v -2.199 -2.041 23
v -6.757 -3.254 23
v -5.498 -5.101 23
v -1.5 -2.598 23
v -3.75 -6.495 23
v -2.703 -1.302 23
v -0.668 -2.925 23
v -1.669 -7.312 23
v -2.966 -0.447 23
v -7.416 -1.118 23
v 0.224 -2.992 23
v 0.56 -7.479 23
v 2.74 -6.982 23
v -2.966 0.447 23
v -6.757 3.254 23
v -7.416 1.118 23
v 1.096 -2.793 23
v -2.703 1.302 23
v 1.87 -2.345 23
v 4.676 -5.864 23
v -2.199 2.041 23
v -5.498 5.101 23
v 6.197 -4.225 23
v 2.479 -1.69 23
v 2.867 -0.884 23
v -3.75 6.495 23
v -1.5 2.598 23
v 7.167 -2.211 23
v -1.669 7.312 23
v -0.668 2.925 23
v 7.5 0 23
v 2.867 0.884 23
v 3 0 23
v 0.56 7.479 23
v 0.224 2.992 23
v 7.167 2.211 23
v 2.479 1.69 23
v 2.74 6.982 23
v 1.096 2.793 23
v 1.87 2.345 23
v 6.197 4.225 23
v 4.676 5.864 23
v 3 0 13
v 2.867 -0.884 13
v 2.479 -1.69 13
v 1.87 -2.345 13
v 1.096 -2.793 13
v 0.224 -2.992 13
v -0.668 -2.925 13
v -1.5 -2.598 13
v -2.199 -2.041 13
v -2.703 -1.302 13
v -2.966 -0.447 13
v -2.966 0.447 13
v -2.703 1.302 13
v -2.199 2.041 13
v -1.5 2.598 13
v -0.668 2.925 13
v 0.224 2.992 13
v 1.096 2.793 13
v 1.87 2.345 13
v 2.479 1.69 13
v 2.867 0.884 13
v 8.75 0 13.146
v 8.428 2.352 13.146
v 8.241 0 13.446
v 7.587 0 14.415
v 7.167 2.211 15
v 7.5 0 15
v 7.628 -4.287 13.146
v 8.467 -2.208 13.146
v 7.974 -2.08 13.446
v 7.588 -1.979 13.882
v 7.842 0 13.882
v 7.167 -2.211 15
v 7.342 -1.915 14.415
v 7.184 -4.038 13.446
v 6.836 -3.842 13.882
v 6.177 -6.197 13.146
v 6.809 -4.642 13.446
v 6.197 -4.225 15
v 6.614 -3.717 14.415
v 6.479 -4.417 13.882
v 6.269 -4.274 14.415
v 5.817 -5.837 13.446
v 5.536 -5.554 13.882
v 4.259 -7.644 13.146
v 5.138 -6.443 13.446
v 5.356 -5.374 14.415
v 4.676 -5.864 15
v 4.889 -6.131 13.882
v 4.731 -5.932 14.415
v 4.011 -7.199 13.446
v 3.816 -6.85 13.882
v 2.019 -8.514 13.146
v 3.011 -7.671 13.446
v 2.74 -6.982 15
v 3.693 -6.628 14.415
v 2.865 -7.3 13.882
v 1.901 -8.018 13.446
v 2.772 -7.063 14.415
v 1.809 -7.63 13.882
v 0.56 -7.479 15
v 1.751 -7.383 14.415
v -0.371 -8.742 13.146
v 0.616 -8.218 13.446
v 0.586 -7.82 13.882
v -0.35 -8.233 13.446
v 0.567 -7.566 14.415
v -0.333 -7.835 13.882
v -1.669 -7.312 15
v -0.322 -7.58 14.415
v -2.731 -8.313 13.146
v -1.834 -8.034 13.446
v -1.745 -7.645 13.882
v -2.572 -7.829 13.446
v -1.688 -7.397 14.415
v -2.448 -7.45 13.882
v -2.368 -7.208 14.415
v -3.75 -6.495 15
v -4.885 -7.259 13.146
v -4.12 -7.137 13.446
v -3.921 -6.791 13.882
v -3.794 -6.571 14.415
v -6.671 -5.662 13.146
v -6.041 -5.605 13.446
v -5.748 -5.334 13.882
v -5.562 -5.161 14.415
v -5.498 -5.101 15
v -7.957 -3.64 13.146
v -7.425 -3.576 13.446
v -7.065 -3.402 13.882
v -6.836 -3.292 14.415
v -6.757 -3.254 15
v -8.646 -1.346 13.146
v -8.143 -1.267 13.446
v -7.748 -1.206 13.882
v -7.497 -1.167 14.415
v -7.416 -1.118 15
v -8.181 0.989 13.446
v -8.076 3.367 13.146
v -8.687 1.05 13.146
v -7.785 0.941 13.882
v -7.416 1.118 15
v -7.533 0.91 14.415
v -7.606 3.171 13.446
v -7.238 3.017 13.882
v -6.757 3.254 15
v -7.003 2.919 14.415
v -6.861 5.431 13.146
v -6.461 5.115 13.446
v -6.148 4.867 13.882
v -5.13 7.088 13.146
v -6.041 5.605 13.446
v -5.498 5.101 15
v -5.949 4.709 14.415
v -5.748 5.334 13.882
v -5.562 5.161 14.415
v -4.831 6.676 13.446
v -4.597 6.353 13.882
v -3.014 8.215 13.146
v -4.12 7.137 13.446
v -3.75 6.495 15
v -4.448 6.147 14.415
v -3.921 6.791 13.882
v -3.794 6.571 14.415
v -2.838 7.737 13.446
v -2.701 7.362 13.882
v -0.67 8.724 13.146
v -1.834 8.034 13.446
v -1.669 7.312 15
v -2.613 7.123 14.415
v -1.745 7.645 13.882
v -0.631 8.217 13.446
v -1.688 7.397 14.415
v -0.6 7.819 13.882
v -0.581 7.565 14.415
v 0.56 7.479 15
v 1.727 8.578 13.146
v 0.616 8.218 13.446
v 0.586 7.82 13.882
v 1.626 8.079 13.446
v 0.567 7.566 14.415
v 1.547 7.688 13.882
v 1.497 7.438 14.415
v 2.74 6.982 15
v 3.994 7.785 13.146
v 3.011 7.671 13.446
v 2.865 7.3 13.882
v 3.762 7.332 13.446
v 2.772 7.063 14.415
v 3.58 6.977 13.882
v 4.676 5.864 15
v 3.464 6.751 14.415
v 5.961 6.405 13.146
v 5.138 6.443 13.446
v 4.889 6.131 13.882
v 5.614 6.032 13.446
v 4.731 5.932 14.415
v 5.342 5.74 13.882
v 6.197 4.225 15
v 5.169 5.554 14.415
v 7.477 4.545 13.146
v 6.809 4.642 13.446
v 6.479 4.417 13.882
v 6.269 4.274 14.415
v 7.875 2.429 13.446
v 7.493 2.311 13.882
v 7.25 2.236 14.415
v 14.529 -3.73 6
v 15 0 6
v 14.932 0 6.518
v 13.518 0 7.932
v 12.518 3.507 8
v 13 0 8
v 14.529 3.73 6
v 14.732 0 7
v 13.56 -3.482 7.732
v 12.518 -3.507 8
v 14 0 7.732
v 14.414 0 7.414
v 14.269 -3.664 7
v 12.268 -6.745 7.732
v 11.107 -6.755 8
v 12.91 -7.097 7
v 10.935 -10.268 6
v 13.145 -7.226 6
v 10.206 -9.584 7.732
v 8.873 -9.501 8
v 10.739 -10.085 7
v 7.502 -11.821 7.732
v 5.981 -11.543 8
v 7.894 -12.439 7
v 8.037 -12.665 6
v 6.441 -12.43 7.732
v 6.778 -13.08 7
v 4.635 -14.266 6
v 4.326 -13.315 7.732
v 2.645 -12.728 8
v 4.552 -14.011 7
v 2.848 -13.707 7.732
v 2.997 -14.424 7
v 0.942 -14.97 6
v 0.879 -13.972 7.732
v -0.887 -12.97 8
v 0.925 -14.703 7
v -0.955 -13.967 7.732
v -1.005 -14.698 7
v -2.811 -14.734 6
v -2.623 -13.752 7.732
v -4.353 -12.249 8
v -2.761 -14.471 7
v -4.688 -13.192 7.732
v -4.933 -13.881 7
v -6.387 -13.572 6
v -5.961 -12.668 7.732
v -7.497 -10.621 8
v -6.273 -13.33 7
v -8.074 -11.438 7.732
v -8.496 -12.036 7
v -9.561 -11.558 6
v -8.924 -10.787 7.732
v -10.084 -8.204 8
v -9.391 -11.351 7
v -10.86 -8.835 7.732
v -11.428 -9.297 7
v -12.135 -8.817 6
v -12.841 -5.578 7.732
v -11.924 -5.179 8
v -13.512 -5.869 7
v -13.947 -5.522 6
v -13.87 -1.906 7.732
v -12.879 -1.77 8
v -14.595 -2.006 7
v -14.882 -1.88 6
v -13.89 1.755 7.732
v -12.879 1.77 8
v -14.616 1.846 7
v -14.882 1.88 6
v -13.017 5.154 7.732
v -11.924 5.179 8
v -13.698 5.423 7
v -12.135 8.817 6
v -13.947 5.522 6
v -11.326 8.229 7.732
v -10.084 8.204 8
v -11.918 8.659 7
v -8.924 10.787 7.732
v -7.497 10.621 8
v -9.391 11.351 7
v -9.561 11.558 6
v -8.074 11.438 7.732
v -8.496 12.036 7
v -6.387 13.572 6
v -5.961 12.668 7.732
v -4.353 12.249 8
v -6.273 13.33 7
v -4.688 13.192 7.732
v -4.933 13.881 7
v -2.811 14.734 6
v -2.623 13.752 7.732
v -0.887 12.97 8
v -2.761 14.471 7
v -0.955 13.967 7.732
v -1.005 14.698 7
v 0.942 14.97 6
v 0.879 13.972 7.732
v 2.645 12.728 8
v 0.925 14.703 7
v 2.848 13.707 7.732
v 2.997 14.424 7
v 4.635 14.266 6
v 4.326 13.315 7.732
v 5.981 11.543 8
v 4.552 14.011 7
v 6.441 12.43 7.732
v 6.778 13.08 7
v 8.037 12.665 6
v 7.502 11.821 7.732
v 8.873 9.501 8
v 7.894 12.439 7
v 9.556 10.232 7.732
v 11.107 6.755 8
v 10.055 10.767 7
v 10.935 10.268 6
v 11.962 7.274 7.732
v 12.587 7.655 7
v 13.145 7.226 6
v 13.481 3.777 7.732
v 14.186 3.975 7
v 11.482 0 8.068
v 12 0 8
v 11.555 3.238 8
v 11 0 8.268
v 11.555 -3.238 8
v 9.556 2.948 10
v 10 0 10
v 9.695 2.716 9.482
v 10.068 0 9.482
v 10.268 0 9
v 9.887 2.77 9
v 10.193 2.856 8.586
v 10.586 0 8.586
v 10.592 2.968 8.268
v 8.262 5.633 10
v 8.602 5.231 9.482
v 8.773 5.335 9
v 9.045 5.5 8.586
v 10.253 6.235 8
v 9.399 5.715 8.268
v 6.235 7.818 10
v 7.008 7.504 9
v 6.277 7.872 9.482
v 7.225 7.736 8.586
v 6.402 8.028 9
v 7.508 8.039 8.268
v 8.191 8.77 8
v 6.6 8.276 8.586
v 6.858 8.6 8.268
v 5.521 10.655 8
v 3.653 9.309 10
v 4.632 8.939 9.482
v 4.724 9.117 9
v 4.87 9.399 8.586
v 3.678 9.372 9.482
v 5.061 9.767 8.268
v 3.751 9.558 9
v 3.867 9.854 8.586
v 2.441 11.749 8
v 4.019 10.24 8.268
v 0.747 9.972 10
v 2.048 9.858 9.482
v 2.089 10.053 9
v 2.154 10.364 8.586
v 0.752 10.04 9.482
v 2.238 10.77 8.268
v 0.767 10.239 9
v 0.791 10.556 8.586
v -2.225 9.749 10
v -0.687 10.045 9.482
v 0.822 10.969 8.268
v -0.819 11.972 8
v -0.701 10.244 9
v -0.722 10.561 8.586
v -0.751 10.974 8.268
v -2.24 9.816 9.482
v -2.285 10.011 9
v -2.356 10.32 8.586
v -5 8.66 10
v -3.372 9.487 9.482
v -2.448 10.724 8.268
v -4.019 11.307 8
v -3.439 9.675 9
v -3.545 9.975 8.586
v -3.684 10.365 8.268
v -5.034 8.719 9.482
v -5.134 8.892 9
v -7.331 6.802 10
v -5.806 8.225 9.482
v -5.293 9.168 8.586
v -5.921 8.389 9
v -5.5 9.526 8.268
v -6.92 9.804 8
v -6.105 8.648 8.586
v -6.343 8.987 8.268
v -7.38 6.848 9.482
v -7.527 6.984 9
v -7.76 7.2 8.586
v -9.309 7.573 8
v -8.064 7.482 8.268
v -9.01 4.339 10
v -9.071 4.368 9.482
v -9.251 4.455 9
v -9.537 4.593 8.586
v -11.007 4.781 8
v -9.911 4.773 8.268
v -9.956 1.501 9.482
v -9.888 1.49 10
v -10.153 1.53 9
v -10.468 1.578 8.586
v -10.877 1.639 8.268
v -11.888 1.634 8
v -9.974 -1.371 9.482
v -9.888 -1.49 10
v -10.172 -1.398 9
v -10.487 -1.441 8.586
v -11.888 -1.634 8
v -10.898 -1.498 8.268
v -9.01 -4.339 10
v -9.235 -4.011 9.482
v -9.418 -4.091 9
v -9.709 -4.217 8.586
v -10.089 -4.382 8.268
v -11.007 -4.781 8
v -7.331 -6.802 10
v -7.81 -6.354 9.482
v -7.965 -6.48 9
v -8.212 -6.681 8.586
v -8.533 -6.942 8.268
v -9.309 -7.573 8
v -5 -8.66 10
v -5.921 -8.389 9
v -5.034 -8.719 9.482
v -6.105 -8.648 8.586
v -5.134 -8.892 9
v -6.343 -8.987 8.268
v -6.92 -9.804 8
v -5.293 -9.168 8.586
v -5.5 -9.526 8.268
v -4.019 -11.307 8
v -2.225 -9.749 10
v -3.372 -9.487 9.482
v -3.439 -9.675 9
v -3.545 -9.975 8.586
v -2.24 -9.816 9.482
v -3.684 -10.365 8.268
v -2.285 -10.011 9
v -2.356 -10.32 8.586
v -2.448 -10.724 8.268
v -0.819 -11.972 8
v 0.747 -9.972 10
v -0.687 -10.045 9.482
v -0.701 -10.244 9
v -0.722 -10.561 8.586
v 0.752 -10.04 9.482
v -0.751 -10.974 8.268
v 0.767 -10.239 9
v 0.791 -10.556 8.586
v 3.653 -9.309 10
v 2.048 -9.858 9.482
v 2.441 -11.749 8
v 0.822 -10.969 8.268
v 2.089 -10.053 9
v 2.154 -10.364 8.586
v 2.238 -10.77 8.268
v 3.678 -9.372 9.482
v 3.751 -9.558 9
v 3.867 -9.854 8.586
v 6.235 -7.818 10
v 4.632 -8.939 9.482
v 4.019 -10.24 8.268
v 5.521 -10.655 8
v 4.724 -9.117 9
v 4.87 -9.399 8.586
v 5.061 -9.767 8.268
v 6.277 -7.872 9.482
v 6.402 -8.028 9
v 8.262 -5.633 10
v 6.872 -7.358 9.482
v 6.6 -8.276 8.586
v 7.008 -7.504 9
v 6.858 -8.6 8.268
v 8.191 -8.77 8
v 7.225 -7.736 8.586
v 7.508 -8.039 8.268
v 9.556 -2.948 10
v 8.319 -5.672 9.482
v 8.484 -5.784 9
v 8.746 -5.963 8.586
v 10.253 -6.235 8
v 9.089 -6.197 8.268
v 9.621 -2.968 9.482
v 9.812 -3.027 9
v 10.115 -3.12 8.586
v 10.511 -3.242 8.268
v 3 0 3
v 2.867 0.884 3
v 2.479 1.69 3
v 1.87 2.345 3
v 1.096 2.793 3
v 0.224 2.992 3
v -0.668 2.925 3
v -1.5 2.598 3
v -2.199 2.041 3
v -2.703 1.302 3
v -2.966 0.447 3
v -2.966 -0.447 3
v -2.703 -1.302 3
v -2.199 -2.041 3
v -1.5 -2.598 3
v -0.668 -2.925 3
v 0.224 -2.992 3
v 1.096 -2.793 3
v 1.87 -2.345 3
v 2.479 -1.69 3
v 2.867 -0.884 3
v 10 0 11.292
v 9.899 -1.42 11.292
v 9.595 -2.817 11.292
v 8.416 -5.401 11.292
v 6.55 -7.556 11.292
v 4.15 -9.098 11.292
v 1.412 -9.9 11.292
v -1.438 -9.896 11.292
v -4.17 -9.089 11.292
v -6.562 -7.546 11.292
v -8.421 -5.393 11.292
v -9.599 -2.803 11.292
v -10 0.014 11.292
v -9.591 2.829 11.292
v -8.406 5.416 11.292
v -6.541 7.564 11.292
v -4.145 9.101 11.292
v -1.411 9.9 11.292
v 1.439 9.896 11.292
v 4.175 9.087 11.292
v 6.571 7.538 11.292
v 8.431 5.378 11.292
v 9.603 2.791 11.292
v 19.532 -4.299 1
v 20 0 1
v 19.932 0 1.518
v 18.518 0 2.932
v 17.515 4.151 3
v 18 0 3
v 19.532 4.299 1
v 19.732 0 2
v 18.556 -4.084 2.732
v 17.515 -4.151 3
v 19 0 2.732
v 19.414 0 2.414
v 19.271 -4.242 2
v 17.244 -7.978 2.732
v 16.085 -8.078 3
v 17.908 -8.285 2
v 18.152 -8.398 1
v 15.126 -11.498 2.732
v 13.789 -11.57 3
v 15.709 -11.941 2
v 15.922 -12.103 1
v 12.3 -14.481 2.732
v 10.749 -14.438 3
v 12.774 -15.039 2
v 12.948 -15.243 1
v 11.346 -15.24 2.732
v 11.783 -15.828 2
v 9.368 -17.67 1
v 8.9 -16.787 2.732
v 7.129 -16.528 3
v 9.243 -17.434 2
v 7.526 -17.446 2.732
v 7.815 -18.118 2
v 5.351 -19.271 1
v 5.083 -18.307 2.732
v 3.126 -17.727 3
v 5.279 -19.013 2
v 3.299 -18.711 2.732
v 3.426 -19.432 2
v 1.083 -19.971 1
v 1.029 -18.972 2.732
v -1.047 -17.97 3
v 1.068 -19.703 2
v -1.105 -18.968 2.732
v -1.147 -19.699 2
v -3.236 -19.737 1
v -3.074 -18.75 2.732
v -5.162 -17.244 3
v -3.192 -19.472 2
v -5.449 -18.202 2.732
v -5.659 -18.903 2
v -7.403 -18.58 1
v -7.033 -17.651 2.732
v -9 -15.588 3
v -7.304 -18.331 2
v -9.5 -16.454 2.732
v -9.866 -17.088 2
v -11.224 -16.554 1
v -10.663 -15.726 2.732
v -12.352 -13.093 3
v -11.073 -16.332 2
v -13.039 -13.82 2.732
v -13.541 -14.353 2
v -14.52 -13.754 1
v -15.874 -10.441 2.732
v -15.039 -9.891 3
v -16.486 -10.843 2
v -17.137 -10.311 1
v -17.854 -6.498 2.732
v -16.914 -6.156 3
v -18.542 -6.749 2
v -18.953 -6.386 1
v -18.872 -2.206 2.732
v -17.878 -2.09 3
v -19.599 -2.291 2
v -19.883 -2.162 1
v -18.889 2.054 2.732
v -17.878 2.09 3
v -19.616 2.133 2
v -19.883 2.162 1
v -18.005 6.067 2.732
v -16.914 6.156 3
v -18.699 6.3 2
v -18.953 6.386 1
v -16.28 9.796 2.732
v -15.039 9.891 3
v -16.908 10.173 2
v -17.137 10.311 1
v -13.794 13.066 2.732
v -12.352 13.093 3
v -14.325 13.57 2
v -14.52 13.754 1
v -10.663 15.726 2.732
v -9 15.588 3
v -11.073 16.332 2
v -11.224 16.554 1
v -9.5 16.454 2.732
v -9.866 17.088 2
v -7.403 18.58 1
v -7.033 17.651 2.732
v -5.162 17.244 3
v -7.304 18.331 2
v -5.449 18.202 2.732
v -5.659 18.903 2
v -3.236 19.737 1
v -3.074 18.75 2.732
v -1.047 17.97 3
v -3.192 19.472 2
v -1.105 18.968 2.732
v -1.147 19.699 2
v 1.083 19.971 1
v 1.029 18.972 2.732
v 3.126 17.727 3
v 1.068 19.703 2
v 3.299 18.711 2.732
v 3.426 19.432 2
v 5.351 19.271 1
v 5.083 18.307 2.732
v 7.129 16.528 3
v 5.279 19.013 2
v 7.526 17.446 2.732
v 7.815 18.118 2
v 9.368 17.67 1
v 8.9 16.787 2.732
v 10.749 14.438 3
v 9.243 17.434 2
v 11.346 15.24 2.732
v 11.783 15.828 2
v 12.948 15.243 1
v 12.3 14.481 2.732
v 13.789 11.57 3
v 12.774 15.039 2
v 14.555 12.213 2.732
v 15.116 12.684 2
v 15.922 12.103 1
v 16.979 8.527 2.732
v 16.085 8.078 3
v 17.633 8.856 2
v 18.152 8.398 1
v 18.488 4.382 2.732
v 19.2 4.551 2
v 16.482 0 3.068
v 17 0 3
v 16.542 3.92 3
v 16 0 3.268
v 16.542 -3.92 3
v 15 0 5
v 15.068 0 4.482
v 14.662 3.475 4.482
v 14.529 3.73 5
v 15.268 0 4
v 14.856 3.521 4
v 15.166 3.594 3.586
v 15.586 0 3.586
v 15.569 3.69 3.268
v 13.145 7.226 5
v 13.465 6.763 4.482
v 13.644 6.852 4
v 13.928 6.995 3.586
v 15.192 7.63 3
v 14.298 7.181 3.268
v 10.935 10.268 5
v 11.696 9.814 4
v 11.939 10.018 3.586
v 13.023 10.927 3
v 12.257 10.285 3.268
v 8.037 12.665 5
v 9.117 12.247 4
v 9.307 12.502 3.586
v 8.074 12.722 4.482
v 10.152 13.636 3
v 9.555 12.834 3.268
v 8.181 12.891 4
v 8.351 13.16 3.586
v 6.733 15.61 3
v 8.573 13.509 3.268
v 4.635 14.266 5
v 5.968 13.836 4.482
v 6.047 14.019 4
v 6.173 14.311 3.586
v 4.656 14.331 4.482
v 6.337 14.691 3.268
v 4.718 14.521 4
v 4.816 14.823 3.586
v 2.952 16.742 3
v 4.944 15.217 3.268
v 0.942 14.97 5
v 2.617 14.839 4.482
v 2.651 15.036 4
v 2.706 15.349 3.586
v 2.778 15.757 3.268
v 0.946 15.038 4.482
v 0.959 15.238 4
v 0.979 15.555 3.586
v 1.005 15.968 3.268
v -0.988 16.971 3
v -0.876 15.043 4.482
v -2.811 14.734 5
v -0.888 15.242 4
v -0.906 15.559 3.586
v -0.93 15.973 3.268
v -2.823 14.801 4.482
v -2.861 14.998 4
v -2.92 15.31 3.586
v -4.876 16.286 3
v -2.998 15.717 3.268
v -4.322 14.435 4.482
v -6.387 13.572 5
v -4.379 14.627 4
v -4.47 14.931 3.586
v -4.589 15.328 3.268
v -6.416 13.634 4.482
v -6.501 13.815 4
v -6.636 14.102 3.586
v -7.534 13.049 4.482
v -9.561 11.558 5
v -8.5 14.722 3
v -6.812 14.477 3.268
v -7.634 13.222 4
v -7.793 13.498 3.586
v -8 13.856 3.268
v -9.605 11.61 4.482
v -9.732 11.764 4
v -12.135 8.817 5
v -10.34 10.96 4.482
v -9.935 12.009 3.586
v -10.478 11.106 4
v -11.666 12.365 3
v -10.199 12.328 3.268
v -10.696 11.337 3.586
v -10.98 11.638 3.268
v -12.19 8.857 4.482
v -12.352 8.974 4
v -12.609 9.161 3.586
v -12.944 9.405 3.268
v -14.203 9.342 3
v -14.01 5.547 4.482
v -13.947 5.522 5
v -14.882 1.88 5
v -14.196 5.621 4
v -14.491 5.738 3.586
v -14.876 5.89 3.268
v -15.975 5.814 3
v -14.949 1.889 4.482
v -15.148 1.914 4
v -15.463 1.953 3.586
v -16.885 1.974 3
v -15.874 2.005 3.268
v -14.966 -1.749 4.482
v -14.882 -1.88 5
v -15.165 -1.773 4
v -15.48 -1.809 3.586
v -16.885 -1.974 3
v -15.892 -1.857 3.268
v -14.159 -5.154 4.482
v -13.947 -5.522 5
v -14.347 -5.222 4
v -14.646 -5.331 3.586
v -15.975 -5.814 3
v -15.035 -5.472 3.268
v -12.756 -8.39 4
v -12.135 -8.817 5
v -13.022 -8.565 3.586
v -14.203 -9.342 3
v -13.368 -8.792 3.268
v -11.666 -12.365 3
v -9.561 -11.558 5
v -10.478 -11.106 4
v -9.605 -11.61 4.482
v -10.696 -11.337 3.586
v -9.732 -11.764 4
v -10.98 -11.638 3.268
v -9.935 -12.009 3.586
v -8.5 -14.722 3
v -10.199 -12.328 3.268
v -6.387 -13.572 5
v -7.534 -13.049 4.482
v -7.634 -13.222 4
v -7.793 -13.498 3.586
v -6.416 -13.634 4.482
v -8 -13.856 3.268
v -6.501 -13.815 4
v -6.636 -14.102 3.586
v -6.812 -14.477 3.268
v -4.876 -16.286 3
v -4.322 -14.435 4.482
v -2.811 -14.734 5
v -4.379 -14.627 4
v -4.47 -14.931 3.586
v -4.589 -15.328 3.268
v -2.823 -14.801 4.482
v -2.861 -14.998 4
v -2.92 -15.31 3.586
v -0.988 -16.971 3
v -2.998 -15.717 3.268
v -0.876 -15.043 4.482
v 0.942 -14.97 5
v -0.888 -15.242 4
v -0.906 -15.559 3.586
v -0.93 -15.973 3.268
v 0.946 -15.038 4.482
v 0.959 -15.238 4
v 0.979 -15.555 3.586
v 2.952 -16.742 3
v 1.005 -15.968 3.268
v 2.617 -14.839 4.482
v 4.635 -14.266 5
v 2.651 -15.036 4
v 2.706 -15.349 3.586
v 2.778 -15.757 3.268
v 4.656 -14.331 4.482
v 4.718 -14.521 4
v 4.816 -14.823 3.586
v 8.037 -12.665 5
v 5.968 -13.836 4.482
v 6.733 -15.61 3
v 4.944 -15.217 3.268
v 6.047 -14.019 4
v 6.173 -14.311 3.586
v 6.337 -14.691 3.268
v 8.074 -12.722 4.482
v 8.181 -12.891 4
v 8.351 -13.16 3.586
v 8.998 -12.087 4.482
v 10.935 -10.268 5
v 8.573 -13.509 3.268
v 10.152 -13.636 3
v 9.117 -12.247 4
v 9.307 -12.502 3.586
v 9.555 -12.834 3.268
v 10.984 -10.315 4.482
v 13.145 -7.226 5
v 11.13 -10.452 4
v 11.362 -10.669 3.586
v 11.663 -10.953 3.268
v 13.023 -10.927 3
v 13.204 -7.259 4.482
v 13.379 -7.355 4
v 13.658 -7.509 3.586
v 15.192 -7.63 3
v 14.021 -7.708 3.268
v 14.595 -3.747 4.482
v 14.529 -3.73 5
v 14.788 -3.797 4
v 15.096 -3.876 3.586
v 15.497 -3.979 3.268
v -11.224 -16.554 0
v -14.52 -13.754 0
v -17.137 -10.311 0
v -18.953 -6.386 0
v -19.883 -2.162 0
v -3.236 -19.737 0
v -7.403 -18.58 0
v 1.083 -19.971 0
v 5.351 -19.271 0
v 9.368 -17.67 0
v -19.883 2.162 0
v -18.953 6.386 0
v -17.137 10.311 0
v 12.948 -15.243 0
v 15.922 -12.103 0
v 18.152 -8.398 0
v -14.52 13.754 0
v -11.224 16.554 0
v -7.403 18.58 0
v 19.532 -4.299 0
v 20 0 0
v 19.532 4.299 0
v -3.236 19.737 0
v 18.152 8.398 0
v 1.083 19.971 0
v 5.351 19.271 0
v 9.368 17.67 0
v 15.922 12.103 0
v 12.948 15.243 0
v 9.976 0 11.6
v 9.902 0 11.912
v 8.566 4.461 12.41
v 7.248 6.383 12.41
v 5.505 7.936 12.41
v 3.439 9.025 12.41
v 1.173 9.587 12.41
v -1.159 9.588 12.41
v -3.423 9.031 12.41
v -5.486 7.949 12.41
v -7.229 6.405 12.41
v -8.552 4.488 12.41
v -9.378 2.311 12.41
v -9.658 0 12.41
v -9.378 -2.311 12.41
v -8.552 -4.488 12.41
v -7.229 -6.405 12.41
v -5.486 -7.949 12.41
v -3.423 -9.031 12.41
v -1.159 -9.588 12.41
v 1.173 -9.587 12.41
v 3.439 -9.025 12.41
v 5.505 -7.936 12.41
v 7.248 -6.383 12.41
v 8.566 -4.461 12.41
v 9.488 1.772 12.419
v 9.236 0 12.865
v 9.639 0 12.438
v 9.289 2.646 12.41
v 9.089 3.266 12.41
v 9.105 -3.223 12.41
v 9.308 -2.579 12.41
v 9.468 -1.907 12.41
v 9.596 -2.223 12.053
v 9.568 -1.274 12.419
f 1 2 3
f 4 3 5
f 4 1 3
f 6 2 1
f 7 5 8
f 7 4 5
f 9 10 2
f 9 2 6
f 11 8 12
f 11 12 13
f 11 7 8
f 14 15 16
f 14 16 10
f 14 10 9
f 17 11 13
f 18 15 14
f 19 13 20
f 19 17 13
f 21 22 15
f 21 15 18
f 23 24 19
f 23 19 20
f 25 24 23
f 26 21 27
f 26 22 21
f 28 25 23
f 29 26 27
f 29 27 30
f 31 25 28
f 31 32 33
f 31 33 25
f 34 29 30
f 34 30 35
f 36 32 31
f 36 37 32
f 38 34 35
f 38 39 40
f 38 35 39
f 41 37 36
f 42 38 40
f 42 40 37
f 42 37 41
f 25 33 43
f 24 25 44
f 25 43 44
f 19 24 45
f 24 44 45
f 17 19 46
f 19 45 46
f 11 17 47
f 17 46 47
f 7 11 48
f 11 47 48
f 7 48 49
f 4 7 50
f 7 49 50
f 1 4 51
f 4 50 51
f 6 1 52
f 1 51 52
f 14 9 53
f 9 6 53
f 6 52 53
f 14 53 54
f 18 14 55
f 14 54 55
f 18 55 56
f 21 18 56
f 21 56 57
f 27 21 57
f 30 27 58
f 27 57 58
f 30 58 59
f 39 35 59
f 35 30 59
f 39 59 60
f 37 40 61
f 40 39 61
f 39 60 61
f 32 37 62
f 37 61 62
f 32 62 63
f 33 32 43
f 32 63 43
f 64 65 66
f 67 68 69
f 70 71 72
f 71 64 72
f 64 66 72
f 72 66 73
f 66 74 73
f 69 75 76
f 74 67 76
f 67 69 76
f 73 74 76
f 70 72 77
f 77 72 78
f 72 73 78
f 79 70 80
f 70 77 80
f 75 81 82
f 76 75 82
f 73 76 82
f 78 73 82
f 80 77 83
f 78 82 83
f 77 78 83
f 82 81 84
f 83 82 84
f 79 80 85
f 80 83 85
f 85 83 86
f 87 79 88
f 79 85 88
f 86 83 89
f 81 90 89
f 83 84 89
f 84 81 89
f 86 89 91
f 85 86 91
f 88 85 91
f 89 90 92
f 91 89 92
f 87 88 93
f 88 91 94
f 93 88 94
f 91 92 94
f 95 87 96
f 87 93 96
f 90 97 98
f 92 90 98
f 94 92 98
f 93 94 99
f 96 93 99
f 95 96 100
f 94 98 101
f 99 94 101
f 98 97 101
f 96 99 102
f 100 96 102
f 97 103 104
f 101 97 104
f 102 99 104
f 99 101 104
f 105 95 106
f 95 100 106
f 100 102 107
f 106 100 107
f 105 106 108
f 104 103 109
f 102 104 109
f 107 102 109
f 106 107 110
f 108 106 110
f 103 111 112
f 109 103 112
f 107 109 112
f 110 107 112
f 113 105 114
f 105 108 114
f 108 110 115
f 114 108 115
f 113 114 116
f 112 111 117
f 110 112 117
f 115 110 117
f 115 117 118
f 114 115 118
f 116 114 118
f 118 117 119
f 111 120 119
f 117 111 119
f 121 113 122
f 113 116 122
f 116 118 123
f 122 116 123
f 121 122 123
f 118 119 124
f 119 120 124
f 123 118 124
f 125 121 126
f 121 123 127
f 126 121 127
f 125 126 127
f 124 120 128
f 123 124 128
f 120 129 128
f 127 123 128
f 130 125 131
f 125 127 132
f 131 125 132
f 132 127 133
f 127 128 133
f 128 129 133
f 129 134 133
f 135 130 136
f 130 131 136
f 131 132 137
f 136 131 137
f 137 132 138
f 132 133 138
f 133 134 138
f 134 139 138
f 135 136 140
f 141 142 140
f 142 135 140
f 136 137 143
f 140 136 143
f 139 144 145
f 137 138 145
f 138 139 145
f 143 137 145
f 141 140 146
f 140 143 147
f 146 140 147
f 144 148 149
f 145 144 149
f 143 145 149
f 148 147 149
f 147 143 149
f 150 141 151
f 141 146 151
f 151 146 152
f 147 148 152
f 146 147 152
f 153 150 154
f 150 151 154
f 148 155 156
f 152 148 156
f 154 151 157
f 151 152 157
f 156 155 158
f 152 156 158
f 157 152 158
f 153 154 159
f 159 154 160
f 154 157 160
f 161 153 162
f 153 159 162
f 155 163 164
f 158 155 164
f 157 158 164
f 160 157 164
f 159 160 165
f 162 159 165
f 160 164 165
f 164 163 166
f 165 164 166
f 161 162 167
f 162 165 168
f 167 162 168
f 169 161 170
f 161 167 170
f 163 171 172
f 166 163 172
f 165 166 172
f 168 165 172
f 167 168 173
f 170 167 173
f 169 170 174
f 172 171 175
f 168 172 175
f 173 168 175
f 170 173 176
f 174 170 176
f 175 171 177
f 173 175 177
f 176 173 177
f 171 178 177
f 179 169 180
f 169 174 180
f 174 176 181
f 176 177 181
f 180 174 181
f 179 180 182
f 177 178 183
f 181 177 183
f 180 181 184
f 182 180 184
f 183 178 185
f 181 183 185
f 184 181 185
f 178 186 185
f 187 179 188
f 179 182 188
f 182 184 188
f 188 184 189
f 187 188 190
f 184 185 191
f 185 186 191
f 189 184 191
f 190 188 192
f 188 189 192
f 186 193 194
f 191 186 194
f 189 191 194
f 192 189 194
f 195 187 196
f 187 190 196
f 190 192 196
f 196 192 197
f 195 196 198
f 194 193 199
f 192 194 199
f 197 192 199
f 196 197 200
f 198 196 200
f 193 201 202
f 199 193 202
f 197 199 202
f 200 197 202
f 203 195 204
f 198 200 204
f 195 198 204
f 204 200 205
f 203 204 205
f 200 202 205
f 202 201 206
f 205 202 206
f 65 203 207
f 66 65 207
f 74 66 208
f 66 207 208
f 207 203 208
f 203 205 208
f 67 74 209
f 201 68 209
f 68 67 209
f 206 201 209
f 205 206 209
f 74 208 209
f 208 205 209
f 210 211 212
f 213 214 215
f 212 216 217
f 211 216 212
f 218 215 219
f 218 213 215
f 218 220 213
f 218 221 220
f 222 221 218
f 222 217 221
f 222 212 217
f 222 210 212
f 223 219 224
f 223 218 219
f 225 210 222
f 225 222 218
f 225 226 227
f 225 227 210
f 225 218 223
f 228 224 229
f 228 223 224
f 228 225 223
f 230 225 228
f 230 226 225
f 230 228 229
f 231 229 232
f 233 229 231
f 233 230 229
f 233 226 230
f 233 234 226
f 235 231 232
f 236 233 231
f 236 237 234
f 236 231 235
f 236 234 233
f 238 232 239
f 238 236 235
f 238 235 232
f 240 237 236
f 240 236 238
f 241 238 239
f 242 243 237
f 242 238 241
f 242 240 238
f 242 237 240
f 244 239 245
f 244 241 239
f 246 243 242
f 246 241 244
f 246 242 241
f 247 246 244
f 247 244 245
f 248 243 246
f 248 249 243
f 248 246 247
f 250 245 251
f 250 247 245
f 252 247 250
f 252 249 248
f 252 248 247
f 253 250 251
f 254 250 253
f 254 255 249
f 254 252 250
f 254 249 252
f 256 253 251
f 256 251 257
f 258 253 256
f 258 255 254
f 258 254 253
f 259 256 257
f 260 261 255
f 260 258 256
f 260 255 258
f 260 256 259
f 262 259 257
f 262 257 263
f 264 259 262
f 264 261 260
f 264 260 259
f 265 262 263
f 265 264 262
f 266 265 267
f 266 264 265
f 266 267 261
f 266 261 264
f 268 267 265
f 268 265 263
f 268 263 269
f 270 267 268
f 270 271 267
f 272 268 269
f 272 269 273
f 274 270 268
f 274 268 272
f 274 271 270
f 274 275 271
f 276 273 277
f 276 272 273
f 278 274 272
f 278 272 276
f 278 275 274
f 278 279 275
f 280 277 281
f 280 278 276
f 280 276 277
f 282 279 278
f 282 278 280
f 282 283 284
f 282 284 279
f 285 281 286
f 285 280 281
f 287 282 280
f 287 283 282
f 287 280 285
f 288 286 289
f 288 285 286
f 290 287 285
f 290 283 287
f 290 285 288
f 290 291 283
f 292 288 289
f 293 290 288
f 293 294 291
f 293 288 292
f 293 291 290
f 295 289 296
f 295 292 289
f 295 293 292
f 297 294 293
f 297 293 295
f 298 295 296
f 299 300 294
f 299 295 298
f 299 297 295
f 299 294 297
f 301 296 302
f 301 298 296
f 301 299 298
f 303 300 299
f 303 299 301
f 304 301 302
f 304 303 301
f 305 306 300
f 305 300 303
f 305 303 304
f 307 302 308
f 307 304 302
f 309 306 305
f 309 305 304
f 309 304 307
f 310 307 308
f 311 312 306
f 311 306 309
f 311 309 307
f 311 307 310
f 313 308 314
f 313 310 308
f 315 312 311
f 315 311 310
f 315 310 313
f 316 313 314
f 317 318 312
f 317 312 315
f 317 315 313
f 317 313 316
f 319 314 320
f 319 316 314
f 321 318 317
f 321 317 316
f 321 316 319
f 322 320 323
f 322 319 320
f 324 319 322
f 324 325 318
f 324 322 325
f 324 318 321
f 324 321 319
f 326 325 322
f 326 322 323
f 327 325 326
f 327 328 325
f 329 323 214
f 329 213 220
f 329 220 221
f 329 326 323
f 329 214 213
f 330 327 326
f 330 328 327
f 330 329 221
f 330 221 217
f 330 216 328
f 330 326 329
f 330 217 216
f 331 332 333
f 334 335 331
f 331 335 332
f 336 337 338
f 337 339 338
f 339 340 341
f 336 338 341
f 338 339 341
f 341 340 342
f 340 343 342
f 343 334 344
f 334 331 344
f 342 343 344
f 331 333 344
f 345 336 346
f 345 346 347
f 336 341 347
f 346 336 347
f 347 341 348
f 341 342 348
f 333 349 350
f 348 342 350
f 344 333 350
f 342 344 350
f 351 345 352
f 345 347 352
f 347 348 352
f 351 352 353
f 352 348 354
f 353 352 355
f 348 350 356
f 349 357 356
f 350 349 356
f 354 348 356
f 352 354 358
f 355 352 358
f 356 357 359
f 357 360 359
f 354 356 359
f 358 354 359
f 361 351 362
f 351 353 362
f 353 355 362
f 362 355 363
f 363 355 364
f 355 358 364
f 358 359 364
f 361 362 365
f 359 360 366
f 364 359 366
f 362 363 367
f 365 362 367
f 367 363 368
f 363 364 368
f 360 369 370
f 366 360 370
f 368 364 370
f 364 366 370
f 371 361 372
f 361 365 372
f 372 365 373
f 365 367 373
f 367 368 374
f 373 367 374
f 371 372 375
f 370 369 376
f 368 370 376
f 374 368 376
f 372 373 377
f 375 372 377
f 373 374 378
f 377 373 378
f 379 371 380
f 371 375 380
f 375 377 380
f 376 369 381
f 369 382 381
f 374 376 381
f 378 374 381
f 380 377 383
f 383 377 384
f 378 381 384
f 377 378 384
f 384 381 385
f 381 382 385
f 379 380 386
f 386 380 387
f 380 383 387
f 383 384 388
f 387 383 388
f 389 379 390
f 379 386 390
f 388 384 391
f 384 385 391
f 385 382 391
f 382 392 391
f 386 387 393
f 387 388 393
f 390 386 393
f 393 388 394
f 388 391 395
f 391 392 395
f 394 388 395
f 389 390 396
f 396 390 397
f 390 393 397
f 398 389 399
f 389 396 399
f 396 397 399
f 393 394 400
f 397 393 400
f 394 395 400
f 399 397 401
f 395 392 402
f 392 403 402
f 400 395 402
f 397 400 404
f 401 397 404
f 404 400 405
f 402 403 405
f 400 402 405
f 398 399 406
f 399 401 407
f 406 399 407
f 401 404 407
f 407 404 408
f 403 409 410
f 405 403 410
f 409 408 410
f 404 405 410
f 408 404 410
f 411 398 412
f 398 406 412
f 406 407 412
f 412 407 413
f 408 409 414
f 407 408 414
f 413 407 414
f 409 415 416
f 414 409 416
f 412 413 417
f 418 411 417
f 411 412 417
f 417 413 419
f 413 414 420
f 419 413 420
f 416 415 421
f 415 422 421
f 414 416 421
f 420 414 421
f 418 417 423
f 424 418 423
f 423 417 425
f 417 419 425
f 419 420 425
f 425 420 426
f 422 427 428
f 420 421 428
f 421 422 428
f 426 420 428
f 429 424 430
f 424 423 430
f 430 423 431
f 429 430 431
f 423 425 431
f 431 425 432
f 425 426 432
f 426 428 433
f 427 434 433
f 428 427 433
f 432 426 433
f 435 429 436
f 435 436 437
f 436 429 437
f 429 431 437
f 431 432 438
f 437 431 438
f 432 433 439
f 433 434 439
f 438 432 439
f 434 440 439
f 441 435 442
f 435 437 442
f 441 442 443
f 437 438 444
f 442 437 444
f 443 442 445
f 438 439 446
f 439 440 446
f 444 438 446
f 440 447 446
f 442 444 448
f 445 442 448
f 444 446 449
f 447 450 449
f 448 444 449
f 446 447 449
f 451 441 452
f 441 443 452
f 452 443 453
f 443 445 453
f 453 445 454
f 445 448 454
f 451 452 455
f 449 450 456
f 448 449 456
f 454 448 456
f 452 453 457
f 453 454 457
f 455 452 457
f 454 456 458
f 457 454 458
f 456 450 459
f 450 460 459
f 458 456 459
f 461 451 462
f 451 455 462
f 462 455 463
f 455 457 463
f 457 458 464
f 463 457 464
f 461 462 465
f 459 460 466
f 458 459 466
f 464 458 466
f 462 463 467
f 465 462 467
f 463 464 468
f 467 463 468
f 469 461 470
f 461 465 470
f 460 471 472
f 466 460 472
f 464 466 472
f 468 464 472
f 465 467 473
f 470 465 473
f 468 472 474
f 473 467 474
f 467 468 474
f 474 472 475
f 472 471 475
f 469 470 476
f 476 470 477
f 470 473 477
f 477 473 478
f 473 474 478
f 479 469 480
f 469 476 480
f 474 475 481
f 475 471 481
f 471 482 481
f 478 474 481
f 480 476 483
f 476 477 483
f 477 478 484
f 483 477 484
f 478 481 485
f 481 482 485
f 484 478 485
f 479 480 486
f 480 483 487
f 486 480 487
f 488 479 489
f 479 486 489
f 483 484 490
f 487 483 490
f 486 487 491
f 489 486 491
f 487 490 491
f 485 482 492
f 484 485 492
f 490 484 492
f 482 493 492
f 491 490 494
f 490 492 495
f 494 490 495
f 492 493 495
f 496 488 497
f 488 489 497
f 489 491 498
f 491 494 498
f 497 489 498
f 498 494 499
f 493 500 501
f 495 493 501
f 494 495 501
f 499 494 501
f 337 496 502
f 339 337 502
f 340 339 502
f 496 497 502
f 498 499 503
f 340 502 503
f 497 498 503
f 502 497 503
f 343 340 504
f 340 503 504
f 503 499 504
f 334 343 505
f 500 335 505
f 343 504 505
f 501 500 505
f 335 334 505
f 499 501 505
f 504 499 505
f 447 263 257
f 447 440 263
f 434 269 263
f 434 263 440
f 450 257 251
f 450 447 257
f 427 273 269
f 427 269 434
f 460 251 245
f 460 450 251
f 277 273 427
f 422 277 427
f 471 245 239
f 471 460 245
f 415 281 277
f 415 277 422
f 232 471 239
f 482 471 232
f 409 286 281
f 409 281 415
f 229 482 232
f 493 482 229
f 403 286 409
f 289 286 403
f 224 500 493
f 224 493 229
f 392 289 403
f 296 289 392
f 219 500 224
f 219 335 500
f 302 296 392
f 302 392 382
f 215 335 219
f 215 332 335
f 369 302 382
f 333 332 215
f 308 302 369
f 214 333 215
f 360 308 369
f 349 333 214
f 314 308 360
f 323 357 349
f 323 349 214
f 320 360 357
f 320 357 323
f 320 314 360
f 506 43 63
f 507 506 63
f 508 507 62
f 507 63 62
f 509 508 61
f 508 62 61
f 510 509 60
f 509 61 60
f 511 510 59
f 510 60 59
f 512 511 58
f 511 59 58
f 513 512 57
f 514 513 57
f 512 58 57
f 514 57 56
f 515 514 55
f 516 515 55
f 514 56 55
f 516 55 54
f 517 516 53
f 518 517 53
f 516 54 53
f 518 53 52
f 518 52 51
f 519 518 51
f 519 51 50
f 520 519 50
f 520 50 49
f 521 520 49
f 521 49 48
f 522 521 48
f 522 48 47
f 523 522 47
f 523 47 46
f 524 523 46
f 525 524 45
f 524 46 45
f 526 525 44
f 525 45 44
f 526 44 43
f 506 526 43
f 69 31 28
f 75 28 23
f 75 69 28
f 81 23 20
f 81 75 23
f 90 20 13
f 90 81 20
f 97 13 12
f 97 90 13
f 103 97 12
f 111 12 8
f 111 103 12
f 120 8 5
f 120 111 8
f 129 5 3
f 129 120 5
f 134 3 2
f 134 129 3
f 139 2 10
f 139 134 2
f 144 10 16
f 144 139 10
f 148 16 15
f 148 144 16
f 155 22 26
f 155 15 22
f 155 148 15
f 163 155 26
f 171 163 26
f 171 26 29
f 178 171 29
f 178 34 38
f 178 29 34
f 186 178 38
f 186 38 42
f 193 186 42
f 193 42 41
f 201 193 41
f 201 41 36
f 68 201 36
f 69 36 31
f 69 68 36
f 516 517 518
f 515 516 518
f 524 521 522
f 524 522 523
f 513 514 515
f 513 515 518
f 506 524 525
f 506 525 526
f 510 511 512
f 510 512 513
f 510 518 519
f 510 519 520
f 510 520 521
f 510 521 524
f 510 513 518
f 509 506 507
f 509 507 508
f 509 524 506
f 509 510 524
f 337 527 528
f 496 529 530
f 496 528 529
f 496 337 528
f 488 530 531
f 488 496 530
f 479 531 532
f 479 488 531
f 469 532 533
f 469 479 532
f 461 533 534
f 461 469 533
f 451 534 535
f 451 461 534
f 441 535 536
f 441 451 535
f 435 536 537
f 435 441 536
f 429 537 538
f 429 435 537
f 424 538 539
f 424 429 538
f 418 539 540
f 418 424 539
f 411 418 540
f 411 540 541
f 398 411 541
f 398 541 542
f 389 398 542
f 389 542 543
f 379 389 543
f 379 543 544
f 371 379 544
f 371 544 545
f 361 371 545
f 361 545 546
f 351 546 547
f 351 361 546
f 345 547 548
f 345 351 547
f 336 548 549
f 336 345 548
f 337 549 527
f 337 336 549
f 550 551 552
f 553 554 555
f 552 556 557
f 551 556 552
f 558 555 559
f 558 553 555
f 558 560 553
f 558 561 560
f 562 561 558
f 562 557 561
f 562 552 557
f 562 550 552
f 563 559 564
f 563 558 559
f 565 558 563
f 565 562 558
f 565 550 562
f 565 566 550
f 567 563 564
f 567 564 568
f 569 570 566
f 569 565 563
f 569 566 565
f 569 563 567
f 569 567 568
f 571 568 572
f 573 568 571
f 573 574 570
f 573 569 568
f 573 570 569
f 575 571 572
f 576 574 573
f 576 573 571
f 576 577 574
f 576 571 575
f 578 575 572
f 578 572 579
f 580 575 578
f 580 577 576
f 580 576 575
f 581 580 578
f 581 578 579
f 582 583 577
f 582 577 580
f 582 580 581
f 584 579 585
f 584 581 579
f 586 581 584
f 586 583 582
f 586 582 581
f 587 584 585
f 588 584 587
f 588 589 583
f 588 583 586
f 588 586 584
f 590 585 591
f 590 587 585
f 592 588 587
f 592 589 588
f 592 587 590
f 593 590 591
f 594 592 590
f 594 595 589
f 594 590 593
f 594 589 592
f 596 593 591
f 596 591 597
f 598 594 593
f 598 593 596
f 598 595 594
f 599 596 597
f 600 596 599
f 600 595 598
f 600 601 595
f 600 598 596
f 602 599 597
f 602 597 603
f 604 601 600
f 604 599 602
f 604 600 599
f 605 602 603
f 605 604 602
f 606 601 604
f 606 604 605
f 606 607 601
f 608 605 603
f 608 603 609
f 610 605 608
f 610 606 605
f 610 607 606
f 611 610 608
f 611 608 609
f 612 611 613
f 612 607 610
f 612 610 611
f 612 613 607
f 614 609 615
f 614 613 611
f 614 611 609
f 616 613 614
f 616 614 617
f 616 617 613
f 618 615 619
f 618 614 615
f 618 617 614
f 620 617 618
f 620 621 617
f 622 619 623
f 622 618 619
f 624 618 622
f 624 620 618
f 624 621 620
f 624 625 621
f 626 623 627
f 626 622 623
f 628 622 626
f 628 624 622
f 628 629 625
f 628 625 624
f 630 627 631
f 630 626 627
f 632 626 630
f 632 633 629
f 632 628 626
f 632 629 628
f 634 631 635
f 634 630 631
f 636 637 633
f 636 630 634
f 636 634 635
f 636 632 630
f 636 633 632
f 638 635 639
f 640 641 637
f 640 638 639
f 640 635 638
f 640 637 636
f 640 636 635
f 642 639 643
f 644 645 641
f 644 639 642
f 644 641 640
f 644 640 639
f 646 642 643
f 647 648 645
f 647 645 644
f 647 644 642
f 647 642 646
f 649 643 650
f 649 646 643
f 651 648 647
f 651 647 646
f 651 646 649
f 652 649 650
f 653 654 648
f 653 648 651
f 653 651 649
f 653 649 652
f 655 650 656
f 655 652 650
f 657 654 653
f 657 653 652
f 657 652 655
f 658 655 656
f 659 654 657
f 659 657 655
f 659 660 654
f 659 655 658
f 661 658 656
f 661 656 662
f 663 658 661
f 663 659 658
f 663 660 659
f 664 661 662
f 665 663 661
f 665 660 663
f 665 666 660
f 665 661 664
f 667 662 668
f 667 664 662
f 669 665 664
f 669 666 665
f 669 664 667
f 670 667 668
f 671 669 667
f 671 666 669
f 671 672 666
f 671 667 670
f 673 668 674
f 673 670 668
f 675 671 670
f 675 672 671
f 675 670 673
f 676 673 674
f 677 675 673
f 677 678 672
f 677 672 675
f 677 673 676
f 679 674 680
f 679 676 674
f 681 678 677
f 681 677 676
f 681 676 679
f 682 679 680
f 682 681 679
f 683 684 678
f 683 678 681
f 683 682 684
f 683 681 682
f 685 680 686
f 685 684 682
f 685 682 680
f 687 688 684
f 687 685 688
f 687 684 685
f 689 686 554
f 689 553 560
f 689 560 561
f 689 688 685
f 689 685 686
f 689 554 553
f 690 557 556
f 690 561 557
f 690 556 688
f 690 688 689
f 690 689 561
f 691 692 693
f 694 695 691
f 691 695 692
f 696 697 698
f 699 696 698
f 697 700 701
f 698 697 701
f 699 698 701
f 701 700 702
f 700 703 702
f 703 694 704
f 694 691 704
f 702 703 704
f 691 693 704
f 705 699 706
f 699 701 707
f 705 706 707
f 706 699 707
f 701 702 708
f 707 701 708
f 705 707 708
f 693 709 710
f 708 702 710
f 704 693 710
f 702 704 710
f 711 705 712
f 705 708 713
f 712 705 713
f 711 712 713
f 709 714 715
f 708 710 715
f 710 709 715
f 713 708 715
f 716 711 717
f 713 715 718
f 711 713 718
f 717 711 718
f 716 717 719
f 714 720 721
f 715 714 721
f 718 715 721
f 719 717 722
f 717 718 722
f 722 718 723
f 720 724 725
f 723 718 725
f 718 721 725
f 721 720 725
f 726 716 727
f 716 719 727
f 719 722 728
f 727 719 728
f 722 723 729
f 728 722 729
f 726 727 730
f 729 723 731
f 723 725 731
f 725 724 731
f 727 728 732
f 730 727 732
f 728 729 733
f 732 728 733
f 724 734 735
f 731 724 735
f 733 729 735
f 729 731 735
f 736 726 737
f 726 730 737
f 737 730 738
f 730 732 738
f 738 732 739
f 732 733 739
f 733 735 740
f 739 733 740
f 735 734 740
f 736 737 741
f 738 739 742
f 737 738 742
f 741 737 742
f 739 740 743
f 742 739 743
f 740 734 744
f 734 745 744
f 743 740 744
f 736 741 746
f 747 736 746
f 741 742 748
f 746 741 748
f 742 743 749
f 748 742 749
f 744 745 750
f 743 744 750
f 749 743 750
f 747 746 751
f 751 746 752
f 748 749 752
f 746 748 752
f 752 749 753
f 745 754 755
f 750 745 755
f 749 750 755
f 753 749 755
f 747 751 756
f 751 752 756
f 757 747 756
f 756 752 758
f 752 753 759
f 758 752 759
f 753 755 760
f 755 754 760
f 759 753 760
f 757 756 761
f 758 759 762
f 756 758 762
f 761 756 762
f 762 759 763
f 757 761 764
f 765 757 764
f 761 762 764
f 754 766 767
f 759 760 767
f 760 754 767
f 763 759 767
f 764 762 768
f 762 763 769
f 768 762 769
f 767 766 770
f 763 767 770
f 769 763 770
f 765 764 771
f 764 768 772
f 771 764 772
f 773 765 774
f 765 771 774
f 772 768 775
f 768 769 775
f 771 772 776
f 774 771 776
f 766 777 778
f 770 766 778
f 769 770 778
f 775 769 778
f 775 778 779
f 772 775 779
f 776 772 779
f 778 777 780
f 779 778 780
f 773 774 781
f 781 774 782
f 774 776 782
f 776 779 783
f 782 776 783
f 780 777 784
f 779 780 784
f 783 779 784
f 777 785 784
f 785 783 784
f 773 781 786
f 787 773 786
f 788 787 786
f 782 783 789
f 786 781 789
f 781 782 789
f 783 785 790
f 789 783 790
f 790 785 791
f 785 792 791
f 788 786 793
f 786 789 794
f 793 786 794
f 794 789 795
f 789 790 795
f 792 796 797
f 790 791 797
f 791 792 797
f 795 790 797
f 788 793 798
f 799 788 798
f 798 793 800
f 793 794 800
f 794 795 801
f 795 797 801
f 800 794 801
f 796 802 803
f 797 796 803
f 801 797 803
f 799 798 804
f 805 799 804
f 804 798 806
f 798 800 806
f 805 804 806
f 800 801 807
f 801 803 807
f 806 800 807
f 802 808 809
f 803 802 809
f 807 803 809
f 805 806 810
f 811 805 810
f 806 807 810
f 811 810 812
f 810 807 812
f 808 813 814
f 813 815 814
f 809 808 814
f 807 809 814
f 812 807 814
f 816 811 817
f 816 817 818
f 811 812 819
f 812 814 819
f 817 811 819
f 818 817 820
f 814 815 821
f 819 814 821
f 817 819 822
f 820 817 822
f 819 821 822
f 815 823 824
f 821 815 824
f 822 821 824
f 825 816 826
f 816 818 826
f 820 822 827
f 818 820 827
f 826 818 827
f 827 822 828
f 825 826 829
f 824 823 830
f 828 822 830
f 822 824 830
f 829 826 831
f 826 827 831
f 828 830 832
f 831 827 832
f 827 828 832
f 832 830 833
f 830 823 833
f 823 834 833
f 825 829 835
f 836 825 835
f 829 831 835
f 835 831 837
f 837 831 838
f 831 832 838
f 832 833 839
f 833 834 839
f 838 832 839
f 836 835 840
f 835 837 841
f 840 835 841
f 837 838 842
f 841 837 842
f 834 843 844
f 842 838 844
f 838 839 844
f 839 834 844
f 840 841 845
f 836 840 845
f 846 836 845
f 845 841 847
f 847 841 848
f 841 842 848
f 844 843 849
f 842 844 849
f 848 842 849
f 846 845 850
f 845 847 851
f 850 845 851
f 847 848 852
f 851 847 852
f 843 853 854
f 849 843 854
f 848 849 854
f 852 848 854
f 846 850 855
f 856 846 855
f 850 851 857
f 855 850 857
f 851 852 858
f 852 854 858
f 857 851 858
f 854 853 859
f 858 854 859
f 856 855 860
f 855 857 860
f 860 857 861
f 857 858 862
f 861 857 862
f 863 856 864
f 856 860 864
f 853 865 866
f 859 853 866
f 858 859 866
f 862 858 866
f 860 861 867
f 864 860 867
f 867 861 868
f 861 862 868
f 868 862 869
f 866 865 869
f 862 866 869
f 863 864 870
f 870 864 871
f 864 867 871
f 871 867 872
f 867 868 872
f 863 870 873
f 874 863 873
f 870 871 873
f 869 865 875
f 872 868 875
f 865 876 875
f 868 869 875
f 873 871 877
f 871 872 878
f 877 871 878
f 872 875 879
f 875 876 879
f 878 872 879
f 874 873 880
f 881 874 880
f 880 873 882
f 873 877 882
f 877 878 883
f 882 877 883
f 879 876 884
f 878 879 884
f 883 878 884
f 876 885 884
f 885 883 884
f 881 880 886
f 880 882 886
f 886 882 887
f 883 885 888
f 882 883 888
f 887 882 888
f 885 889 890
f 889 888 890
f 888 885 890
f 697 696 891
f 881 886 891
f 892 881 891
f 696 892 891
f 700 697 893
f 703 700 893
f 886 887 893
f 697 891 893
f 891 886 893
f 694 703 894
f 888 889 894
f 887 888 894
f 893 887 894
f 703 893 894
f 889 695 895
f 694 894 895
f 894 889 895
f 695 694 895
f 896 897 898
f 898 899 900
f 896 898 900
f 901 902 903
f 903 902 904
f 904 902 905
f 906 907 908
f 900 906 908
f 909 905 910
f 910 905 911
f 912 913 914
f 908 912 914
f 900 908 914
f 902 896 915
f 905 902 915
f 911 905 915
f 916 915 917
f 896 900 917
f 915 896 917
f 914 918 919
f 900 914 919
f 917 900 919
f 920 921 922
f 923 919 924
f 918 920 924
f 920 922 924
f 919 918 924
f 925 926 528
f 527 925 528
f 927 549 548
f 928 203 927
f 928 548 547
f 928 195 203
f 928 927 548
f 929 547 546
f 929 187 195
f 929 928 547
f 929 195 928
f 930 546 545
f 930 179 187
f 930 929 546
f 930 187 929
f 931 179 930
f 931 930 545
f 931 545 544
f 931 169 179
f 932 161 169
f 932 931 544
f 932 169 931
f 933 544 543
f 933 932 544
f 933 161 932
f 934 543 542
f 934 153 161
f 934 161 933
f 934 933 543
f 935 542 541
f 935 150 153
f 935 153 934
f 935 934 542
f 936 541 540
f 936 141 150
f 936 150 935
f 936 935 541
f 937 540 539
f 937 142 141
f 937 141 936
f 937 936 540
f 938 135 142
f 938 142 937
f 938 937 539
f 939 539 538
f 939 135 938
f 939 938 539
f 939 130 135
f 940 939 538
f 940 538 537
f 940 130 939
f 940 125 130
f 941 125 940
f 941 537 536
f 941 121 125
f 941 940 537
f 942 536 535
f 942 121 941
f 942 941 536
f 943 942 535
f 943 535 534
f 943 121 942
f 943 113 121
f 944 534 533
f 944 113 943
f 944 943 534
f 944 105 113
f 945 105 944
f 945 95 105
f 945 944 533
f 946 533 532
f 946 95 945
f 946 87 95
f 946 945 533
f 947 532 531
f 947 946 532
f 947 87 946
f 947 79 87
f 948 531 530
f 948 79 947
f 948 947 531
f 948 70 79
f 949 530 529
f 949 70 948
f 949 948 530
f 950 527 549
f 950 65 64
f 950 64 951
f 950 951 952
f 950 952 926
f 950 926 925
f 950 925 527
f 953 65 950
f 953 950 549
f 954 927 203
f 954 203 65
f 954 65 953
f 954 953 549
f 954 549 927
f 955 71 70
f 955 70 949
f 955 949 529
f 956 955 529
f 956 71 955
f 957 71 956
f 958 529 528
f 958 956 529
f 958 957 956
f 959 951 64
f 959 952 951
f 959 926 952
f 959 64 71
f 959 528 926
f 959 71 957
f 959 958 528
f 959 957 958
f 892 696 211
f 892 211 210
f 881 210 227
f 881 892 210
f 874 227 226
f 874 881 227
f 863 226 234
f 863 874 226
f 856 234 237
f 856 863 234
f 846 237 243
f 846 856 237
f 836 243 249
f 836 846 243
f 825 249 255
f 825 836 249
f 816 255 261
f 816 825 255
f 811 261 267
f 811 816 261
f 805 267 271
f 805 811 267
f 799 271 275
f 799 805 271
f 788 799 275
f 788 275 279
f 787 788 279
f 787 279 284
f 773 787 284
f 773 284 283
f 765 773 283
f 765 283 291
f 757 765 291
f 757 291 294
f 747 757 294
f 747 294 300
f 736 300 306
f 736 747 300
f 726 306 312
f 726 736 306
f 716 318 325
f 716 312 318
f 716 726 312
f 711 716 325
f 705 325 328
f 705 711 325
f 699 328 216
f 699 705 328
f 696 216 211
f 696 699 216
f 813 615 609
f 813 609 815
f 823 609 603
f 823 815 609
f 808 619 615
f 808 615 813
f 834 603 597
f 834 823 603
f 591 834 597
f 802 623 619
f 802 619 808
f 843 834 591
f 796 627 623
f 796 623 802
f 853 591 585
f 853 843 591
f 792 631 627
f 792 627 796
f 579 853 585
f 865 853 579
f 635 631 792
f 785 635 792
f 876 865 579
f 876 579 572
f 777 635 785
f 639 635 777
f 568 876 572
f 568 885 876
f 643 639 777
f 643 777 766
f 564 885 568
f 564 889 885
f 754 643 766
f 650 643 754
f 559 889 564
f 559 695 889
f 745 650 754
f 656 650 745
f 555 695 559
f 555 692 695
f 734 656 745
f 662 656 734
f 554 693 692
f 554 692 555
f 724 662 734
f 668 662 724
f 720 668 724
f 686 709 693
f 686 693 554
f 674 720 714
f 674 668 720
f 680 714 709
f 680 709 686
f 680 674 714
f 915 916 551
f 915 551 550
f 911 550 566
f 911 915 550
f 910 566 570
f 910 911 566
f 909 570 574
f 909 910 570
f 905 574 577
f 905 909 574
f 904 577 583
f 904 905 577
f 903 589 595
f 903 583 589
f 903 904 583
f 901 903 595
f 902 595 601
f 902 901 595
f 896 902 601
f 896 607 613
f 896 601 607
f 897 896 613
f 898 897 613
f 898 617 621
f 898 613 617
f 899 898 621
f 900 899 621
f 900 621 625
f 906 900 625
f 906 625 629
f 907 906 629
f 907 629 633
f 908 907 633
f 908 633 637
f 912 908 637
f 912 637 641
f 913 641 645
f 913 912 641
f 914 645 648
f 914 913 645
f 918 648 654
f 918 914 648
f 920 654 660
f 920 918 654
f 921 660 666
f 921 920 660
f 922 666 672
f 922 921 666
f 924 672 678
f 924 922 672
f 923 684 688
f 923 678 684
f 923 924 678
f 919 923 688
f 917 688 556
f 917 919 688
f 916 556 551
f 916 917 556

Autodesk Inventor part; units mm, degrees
ref_plane "YZ Plane" through (0, 0, 0) normal (1, 0, 0) x (0, 1, 0)
ref_plane "XZ Plane" through (0, 0, 0) normal (0, 1, 0) x (-1, 0, 0)
ref_plane "XY Plane" through (0, 0, 0) normal (0, 0, 1) x (1, 0, 0)
sketch "Boceto1" plane through (0, 0, 0) normal (0, 0, 1) x (1, 0, 0)
  circle A0 centre (0, 0) radius 20
  dimension "d0" = 40
extrude "Extrusión1" add sketch "Boceto1" along normal blind 3
sketch "Boceto2" plane through (0, 0, 3) normal (0, 0, 1) x (1, 0, 0)
  circle A0 centre (0, 0) radius 15
  dimension "d3" = 30
extrude "Extrusión2" add sketch "Boceto2" along normal blind 5
sketch "Boceto3" plane through (0, 0, 8) normal (0, 0, 1) x (1, 0, 0)
  circle A0 centre (0, 0) radius 3
  circle A1 centre (0, 0) radius 7.5
  dimension "d6" = 6
  dimension "d7" = 15
extrude "Extrusión3" add sketch "Boceto3" along normal blind 15
sketch "Boceto4" plane through (0, 0, 8) normal (0, 0, 1) x (1, 0, 0)
  circle A0 centre (0, 0) radius 10
  dimension "d10" = 20
extrude "Extrusión4" add sketch "Boceto4" along normal blind 5
sketch "Boceto5" plane through (0, 0, 23) normal (0, 0, 1) x (1, 0, 0)
  circle A0 centre (0, 0) radius 3
extrude "Extrusión5" cut sketch "Boceto5" against normal blind 20
fillet "Empalme1" radius 2 6 edges at (-7.5, 0, 13) (-10, 0, 13) (-10, 0, 8) (-15, 0, 8) (-15, 0, 3) (-20, 0, 3)
properties part number "antena_down"
